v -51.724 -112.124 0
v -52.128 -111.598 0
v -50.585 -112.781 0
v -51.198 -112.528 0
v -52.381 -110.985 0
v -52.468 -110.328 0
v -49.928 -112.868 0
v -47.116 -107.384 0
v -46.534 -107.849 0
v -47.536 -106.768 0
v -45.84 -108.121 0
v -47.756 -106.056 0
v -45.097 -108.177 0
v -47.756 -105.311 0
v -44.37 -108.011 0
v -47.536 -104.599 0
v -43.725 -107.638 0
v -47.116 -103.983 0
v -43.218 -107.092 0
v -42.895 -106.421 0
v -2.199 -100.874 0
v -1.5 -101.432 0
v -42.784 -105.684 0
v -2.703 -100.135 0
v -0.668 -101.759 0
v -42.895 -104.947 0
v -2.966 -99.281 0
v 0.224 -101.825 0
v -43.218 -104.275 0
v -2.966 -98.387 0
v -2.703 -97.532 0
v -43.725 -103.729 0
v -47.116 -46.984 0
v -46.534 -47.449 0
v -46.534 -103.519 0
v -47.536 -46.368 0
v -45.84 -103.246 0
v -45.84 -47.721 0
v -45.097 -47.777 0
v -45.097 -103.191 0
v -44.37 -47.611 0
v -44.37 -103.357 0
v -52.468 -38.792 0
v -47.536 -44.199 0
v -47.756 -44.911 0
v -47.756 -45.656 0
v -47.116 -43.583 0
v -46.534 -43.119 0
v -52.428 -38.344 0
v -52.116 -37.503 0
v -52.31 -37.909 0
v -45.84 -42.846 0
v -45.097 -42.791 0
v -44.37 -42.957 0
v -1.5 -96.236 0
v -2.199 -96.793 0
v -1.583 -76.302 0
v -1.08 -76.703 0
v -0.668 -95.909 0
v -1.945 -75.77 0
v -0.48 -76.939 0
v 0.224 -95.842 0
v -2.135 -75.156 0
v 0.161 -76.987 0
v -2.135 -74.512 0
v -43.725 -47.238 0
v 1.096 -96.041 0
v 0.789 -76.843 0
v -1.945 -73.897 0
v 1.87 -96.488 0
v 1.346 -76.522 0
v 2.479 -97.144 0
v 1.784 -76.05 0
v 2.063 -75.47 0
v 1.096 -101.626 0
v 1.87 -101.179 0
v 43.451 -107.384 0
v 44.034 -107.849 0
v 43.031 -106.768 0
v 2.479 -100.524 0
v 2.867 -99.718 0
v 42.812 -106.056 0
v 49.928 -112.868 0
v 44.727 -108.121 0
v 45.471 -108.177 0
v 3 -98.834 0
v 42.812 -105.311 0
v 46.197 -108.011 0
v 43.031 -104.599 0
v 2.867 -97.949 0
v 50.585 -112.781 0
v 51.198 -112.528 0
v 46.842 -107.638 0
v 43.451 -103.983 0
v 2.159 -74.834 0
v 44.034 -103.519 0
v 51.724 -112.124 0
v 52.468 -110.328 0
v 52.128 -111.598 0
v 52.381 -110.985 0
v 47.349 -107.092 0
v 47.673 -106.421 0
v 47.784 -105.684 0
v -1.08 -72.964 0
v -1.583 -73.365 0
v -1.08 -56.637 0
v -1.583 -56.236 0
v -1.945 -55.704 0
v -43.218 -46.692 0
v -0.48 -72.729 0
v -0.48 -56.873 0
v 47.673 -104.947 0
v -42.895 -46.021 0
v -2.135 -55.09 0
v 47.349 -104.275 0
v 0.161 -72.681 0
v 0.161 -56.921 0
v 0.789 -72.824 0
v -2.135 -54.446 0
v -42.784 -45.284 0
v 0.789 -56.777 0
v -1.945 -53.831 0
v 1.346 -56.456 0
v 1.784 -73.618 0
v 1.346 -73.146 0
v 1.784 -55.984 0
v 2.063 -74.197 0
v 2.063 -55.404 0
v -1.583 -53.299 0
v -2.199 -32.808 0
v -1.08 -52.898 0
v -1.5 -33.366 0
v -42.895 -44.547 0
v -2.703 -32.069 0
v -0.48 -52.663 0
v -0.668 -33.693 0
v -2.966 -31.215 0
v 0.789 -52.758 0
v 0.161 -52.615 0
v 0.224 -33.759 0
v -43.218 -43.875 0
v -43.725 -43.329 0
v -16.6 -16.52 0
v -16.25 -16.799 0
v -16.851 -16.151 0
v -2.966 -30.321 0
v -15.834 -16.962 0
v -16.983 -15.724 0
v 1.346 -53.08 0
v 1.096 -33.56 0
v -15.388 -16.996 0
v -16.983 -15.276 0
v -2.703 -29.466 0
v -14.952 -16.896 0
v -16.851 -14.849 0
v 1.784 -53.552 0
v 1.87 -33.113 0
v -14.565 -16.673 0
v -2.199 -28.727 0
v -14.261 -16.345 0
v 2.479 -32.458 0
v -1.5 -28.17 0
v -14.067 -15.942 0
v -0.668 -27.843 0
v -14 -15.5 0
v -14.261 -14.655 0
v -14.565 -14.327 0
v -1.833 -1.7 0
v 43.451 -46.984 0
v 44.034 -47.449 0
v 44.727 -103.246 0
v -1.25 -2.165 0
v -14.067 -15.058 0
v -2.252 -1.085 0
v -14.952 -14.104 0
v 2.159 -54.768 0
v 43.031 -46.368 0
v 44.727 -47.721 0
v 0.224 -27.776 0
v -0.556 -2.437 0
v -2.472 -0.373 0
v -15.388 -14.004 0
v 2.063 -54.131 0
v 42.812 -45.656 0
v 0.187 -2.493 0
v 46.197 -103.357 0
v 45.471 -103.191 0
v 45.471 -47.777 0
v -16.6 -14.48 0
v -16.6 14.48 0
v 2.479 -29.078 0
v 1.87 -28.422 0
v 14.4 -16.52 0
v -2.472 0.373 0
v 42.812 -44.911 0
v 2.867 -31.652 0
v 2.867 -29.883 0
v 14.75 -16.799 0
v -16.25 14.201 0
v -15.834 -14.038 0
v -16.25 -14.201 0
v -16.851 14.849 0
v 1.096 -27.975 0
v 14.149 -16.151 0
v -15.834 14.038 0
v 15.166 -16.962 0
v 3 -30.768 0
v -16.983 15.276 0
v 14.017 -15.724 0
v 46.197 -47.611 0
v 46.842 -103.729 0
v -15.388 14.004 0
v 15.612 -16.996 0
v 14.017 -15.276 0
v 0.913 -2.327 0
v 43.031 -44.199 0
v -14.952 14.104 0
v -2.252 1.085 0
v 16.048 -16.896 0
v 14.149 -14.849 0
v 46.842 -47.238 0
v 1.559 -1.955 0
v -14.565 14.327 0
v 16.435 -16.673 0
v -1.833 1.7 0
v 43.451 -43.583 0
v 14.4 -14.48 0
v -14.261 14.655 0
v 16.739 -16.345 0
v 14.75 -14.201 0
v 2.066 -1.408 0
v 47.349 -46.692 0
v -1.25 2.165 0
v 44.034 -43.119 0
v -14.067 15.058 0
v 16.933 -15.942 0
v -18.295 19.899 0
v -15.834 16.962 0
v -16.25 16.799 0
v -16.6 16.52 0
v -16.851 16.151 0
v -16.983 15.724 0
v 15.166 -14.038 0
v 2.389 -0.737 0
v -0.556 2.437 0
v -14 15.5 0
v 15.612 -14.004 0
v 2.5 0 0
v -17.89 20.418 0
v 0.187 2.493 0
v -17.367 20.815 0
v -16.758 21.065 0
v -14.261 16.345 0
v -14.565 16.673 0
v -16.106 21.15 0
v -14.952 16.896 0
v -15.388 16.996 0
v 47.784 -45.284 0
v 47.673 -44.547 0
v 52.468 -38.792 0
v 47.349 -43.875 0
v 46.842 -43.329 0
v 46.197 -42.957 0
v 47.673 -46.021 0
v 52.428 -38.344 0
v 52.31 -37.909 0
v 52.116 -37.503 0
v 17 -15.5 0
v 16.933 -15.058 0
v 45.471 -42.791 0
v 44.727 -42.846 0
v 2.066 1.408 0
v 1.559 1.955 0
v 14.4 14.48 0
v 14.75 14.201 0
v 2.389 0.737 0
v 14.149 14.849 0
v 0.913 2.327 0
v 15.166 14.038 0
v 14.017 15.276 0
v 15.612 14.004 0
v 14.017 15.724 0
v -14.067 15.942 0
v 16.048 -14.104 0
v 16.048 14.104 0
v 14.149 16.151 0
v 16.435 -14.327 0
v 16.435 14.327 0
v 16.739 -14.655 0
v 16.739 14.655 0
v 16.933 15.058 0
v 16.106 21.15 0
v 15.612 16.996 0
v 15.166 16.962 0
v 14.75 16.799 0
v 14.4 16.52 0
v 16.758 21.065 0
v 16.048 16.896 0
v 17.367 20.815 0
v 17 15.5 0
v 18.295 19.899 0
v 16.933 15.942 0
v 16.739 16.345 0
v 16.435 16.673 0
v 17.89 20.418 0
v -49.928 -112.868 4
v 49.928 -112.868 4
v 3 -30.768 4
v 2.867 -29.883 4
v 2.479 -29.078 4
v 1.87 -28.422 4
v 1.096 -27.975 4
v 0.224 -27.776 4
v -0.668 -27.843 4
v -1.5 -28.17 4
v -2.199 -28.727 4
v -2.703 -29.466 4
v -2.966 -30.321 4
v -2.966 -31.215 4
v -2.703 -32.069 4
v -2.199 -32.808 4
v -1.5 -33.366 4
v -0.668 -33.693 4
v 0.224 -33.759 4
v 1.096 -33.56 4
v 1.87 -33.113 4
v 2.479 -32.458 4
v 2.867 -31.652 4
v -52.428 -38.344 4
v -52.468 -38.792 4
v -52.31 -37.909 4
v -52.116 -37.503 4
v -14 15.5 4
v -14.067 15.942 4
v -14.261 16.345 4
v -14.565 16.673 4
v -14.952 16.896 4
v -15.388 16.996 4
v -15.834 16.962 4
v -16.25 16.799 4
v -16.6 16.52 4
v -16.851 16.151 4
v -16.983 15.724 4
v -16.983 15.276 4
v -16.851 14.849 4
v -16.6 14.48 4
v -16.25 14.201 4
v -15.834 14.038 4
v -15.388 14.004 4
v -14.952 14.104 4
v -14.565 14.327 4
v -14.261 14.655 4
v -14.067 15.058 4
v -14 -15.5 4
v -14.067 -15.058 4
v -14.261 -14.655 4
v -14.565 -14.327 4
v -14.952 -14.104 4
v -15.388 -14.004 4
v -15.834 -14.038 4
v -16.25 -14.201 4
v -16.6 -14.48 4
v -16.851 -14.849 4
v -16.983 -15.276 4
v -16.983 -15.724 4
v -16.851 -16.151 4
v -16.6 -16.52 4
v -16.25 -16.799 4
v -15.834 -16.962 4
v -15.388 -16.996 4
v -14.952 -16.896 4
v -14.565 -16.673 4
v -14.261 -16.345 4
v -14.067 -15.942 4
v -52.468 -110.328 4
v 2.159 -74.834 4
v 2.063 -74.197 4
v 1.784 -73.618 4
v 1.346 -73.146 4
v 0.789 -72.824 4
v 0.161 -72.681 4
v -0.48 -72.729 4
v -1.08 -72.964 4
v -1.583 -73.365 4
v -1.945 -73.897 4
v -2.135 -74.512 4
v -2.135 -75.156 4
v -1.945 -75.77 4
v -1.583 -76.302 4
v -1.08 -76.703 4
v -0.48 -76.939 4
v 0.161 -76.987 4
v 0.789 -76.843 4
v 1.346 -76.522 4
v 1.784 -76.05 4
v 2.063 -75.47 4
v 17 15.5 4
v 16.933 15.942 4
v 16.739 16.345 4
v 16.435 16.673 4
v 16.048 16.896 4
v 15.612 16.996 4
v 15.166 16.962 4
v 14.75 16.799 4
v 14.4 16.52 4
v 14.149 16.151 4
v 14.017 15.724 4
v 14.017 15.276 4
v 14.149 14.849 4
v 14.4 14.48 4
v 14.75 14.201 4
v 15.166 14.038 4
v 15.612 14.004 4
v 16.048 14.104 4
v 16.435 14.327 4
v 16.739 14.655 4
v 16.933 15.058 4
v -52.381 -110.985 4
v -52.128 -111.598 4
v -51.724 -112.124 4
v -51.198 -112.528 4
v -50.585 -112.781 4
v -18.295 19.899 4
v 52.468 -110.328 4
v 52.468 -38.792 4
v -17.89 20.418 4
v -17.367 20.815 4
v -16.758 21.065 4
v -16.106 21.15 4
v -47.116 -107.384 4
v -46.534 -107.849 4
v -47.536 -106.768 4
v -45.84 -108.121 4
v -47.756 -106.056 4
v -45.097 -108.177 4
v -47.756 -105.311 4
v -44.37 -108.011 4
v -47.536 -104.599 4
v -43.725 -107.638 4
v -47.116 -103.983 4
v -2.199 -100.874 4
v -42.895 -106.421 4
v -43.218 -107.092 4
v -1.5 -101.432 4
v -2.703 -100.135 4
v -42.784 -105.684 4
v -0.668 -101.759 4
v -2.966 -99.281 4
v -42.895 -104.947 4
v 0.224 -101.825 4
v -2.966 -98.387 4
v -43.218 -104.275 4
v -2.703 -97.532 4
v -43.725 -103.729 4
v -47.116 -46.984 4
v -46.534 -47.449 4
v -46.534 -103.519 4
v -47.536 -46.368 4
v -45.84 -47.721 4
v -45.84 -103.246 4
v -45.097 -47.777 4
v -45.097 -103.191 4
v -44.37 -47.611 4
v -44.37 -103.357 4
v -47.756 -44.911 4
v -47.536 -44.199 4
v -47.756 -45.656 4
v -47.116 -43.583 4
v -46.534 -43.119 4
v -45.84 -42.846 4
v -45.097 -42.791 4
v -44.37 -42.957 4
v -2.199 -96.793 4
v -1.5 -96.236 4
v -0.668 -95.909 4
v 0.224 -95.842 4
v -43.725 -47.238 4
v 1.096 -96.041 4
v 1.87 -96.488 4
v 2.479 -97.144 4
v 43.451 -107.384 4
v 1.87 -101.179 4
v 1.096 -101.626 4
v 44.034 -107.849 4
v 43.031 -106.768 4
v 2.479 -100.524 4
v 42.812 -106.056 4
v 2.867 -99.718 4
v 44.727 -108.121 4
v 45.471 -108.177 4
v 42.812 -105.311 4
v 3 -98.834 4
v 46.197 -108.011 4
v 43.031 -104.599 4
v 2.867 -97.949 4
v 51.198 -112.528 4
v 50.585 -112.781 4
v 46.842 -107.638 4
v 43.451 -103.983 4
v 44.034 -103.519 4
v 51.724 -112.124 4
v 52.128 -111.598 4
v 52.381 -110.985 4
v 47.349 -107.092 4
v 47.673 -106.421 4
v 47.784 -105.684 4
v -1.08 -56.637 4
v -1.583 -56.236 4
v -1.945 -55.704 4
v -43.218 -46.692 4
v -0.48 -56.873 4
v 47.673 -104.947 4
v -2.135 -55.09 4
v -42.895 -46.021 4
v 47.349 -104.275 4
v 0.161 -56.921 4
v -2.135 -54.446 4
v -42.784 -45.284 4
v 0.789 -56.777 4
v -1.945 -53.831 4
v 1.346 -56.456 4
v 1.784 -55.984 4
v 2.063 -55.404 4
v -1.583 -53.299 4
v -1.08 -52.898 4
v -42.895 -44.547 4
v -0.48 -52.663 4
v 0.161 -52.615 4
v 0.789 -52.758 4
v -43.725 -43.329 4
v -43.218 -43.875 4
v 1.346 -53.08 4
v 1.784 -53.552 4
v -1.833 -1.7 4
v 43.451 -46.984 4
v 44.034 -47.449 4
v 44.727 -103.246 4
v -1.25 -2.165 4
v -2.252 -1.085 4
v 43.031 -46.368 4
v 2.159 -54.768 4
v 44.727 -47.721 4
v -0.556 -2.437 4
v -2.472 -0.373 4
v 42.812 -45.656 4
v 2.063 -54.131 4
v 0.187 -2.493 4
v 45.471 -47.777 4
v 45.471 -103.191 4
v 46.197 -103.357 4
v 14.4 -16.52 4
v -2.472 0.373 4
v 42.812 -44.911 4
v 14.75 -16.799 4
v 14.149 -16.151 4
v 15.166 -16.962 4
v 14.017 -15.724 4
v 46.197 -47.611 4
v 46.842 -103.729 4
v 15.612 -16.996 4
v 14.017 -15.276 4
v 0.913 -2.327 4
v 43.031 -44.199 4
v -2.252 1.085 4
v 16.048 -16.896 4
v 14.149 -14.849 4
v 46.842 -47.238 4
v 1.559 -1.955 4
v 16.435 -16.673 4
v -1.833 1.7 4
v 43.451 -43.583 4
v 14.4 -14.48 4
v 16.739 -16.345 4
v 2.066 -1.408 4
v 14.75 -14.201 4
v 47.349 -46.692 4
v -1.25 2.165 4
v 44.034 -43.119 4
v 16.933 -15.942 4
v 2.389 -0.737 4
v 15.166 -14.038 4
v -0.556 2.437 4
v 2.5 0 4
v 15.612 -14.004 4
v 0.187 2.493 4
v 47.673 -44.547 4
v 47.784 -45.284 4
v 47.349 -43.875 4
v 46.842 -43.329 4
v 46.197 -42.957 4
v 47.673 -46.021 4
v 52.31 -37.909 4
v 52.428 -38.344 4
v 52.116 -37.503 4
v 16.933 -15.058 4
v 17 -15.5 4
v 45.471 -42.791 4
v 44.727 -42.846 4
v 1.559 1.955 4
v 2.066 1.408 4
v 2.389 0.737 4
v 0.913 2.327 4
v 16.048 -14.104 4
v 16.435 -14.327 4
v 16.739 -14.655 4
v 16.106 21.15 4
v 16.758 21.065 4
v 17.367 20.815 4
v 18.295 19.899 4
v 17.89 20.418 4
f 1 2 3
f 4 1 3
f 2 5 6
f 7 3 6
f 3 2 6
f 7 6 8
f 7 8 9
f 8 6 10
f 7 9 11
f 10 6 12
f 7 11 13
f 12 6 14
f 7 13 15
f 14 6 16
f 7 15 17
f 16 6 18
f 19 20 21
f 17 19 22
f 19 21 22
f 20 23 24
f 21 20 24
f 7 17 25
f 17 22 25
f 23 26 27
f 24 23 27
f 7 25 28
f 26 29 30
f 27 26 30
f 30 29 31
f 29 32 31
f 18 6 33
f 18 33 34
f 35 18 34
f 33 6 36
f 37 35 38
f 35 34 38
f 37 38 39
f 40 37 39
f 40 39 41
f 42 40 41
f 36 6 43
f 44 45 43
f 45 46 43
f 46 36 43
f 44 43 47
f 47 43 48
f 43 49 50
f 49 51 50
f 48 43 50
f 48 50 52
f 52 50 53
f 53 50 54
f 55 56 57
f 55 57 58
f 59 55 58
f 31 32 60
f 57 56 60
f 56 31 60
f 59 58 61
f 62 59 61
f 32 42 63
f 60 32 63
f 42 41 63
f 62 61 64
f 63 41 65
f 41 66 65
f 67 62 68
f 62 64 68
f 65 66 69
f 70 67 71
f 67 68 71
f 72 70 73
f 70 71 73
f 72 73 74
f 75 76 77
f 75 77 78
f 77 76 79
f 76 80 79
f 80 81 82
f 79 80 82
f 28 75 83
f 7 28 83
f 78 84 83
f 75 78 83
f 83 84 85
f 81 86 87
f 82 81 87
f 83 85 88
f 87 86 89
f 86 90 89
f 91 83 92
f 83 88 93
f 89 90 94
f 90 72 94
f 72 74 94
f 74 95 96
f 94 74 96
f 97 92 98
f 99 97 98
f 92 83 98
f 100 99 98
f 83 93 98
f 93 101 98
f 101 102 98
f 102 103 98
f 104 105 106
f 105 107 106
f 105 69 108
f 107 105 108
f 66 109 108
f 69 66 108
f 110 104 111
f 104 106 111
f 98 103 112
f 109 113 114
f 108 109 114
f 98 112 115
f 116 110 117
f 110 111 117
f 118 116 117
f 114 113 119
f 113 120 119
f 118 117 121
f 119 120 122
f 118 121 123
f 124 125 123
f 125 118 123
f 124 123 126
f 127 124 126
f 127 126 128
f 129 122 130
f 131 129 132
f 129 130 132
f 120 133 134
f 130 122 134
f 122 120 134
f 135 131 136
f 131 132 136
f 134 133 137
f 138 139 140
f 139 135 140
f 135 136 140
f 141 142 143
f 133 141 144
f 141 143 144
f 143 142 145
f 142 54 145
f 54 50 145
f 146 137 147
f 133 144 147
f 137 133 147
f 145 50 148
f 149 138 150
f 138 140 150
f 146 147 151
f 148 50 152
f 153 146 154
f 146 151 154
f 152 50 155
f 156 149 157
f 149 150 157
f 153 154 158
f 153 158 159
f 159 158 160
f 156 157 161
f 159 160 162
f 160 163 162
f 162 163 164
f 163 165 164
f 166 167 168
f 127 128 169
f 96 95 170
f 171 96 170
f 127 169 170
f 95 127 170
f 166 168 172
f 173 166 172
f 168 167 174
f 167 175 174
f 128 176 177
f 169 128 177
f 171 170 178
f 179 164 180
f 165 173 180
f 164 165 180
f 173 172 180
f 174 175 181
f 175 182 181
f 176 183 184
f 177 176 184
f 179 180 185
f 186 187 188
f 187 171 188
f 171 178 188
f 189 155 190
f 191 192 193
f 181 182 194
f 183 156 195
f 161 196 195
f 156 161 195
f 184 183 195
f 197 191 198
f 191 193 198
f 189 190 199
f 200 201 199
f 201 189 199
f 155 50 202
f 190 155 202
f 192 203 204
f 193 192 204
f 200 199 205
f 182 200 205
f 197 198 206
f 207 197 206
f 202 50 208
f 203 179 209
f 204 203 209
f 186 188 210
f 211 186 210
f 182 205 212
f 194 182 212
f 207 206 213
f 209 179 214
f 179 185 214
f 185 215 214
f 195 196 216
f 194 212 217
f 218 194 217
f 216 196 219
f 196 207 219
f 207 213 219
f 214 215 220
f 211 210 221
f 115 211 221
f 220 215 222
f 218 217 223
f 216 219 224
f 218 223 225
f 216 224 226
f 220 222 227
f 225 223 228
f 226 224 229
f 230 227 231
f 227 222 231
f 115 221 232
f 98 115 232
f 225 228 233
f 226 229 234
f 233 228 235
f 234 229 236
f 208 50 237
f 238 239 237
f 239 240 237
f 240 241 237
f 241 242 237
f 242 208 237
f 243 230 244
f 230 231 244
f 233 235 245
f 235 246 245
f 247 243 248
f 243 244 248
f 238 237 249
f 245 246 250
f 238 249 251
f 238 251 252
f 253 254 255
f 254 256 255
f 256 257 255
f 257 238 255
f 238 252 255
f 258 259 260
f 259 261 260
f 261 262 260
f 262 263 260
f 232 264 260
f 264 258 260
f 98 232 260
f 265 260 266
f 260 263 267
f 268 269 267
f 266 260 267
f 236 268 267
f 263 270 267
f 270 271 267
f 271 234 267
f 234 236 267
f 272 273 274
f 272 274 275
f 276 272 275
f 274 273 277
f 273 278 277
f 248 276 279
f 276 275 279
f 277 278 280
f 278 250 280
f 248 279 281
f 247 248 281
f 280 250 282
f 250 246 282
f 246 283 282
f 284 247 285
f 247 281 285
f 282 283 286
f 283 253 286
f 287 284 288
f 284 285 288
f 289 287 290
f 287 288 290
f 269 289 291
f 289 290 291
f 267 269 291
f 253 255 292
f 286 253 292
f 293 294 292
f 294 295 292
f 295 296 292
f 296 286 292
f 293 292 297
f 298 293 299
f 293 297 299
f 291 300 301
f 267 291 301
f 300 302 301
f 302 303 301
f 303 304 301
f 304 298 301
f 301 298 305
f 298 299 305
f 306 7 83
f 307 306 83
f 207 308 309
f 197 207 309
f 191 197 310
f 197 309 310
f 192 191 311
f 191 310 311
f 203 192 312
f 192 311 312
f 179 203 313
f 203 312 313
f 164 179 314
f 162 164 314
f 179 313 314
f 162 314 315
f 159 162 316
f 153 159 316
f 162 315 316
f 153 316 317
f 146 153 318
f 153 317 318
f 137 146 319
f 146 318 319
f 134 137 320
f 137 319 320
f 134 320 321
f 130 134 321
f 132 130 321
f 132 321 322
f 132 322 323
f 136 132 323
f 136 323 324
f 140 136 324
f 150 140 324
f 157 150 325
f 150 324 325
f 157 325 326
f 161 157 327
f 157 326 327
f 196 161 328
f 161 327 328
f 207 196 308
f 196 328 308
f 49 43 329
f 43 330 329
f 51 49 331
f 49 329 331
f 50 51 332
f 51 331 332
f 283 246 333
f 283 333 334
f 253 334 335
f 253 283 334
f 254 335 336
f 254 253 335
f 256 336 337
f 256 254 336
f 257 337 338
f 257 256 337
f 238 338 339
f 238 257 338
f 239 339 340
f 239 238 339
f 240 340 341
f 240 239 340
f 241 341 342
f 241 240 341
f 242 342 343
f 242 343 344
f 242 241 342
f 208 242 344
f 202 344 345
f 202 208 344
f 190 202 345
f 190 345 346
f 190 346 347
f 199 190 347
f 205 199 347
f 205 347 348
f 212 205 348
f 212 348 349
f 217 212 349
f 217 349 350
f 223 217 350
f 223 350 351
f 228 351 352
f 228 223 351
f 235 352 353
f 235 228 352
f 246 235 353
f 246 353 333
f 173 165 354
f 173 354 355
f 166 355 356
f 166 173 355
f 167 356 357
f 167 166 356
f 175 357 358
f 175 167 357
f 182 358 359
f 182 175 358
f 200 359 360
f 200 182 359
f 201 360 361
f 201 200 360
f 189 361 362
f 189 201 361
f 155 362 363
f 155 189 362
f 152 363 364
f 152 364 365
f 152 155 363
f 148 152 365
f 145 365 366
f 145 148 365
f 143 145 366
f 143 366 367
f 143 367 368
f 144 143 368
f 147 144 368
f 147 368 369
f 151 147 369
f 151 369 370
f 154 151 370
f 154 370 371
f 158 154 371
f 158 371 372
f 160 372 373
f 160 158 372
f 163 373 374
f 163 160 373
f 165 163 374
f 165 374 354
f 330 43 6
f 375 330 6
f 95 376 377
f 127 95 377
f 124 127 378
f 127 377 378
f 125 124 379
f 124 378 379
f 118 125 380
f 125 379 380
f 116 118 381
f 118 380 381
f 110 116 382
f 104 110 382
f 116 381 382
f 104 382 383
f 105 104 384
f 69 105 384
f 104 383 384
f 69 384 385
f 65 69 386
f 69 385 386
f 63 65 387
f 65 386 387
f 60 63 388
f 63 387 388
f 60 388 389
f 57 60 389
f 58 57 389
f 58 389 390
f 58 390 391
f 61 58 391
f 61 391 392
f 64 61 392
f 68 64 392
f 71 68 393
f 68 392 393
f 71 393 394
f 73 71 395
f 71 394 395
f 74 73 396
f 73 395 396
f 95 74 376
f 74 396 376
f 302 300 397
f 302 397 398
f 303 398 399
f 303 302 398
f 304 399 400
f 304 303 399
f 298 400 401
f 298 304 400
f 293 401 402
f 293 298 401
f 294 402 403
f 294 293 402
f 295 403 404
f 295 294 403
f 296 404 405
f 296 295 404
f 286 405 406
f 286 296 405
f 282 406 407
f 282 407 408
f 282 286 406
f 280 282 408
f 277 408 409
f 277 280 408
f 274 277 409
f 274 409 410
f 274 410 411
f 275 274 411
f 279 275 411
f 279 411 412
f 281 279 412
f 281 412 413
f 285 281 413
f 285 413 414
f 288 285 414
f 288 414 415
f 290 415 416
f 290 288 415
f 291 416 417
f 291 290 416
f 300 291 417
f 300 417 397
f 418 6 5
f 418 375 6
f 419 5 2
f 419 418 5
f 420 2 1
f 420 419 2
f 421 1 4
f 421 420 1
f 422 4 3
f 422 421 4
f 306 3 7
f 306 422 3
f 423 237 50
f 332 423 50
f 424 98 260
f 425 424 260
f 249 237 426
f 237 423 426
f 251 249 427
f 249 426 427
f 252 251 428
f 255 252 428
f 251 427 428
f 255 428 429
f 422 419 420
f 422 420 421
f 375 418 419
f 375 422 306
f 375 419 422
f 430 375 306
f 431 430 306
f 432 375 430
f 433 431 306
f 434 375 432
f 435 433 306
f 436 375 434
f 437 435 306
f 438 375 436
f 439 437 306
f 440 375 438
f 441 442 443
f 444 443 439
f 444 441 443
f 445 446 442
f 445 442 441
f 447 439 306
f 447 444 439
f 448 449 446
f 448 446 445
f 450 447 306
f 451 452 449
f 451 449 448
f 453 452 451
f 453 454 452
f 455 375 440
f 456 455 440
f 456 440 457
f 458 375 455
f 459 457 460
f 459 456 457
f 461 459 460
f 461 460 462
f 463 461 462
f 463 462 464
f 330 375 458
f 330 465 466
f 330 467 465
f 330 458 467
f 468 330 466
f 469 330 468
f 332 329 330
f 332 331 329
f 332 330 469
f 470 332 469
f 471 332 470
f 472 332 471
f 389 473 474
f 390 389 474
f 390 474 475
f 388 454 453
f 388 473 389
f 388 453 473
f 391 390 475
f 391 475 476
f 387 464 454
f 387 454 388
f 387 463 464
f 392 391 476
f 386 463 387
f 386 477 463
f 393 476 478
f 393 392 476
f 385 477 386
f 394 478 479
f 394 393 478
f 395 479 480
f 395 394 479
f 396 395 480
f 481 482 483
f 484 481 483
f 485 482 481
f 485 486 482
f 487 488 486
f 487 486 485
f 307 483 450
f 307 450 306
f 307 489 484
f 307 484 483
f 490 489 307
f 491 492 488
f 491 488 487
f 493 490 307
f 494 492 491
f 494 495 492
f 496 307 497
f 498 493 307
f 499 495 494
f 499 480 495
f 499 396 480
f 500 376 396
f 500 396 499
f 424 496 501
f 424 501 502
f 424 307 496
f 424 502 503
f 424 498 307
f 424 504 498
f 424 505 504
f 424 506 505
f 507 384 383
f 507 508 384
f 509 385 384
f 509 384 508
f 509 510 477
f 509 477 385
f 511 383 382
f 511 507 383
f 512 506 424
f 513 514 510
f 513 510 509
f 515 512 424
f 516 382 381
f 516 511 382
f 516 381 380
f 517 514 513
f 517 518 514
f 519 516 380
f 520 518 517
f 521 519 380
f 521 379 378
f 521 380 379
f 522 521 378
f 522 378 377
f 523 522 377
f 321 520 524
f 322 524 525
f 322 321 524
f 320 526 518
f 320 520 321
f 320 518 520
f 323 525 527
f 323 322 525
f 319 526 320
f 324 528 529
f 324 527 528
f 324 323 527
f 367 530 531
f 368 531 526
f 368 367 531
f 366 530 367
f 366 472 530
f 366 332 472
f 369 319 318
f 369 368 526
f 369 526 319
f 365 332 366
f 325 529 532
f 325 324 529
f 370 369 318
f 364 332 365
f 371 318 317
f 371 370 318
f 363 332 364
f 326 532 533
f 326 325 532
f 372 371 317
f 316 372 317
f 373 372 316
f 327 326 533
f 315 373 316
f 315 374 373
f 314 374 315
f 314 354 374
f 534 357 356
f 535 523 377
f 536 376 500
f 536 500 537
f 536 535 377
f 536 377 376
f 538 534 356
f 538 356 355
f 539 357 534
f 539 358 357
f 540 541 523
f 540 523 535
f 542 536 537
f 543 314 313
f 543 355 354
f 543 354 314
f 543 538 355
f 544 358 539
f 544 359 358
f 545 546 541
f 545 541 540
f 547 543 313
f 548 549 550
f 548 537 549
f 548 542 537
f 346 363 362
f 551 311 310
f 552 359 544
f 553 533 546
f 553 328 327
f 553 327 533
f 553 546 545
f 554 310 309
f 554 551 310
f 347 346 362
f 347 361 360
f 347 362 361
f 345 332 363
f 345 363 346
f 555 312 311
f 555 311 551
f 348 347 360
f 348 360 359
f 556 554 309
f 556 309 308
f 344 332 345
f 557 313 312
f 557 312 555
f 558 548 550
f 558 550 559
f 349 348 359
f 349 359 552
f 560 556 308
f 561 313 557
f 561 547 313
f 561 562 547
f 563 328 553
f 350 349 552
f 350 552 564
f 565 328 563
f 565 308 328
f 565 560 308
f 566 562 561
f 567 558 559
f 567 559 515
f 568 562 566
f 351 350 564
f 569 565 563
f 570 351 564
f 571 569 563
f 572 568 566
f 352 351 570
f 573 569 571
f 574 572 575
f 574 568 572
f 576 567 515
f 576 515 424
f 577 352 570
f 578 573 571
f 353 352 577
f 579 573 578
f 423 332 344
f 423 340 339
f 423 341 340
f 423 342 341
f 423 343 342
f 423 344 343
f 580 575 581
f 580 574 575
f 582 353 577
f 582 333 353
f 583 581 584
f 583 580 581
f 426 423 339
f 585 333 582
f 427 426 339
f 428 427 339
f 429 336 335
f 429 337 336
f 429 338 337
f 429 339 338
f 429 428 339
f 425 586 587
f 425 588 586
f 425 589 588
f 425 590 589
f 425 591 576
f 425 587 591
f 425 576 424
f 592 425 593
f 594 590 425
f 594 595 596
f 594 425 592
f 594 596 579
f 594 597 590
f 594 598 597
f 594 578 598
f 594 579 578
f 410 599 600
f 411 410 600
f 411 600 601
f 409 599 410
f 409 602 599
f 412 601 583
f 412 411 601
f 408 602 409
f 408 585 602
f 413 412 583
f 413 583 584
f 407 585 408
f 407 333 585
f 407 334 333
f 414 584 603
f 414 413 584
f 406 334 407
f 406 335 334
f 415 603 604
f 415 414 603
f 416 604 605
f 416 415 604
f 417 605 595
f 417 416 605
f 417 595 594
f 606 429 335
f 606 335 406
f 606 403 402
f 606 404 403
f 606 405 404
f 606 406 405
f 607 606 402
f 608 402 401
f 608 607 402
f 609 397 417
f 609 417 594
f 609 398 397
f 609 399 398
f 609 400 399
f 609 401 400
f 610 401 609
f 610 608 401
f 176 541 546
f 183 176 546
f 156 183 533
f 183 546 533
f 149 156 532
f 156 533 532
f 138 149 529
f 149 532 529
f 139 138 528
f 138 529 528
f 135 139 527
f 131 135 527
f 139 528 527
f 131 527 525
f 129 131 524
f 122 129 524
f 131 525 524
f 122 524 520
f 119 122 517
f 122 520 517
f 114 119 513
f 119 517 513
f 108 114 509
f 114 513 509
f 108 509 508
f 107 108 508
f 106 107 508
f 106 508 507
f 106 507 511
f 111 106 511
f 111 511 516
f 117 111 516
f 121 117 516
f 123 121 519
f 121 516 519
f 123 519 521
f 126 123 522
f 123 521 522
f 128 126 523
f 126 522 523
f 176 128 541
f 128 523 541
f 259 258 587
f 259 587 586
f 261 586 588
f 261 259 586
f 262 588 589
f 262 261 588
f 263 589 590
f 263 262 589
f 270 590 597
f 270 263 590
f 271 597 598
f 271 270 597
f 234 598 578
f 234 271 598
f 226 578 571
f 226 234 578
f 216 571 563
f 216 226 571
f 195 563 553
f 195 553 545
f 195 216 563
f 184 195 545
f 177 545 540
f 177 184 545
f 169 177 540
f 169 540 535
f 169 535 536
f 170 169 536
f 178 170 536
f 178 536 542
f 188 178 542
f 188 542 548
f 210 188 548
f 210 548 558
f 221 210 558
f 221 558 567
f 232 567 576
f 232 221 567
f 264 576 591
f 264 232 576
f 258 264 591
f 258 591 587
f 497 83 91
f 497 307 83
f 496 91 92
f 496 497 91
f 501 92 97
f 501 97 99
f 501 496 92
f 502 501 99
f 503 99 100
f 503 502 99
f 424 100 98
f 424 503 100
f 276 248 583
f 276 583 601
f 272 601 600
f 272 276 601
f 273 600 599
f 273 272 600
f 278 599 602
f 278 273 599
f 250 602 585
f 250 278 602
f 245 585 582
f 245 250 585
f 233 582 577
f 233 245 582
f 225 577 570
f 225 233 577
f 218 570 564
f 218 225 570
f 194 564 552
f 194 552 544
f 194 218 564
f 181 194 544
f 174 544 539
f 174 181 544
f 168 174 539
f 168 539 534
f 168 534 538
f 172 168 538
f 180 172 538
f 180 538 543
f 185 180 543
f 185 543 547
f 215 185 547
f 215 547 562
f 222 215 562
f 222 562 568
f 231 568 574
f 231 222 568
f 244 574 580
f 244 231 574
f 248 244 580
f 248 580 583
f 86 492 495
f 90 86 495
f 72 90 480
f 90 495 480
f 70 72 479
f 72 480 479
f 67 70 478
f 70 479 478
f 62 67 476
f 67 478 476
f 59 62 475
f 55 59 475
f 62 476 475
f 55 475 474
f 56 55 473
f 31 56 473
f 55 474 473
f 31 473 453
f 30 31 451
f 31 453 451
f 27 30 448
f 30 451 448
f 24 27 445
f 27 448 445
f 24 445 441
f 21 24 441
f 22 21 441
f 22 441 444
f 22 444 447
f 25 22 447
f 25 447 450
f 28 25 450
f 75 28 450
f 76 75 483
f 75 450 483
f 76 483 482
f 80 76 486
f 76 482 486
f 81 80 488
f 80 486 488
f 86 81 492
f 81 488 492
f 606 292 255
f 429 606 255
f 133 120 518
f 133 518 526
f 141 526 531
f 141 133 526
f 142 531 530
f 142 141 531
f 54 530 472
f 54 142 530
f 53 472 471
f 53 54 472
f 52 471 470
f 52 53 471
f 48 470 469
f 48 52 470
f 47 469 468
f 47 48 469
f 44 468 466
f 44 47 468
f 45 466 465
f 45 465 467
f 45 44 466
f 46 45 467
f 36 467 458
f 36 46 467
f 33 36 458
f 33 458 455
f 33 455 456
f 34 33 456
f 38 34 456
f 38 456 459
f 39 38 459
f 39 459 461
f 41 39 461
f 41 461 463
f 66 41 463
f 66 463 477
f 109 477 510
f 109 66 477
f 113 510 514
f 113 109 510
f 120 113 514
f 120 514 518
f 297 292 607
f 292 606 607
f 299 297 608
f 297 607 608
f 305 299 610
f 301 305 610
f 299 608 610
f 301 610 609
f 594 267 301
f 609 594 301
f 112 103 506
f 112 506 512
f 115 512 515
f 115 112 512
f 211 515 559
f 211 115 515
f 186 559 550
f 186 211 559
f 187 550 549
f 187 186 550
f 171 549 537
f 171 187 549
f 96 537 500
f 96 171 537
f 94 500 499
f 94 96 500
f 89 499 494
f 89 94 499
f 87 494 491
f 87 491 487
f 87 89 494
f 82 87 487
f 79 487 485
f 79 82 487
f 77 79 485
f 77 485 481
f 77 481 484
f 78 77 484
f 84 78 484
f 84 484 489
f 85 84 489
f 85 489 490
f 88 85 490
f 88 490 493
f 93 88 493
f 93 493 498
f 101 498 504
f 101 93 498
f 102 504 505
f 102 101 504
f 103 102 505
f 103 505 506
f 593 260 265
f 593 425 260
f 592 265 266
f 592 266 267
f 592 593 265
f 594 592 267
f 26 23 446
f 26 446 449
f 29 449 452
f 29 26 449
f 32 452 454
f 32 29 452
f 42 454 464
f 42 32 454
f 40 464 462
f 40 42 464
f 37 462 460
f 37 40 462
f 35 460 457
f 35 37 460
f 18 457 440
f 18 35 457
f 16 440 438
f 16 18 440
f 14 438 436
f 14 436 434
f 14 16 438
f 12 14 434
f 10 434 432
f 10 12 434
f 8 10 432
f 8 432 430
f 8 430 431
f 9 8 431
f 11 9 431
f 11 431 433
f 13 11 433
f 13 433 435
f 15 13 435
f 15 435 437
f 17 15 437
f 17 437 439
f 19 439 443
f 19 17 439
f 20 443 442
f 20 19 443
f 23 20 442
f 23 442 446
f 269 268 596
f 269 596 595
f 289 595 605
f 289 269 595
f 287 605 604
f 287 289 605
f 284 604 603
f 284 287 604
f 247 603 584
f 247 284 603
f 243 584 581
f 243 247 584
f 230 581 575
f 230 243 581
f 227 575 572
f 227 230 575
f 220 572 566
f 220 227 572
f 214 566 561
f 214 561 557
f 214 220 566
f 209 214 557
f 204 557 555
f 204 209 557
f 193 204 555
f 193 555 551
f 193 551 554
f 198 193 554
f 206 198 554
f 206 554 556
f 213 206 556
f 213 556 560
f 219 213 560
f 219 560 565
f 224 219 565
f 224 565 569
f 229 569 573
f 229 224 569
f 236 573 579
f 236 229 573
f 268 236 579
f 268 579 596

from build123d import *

# Parameters (mm, degrees)
SKETCH4_R           = 2.5
SKETCH4_R_2         = 1.5
BOSS_EXTRUDE1_DEPTH = 4
SKETCH5_R           = 2.159
SKETCH5_R_2         = 3
CUT_EXTRUDE1_DEPTH  = 4
FILLET1_R           = 2.54


with BuildPart() as part:
    # Sketch4 → Boss-Extrude1 (new body)
    with BuildSketch(Plane.XY):
        Polygon((-52.467947032, -38.099537239), (-52.467947032, -112.867947032), (52.467947032, -112.867947032), (52.467947032, -38.099537239), (17.557897552, 21.15), (-17.557897552, 21.15), align=None)
        with Locations((-45.283742135, -45.283742135)):
            Circle(SKETCH4_R, mode=Mode.SUBTRACT)
        with Locations((45.283742135, -45.283742135)):
            Circle(SKETCH4_R, mode=Mode.SUBTRACT)
        with Locations((45.283742135, -105.683742135)):
            Circle(SKETCH4_R, mode=Mode.SUBTRACT)
        with Locations((-45.283742135, -105.683742135)):
            Circle(SKETCH4_R, mode=Mode.SUBTRACT)
        with Locations((-15.5, -15.5)):
            Circle(SKETCH4_R_2, mode=Mode.SUBTRACT)
        with Locations((-15.5, 15.5)):
            Circle(SKETCH4_R_2, mode=Mode.SUBTRACT)
        with Locations((15.5, 15.5)):
            Circle(SKETCH4_R_2, mode=Mode.SUBTRACT)
        with Locations((15.5, -15.5)):
            Circle(SKETCH4_R_2, mode=Mode.SUBTRACT)
        Circle(SKETCH4_R, mode=Mode.SUBTRACT)
    extrude(amount=BOSS_EXTRUDE1_DEPTH)

    # Sketch5 → Cut-Extrude1 (cut)
    with BuildSketch(Plane.XY.offset(4)):
        with Locations((0, -54.767742135)):
            Circle(SKETCH5_R)
        with Locations((0, -74.833742135)):
            Circle(SKETCH5_R)
        with Locations((0, -30.767742135)):
            Circle(SKETCH5_R_2)
        with Locations((0, -98.833742135)):
            Circle(SKETCH5_R_2)
    extrude(amount=-CUT_EXTRUDE1_DEPTH, mode=Mode.SUBTRACT)

    # Fillet1
    fillet1_edges = [part.edges().sort_by_distance(p)[0] for p in [
        (-52.467947032, -38.099537239, 2),
        (-17.557897552, 21.15, 2),
        (17.557897552, 21.15, 2),
        (52.467947032, -38.099537239, 2),
        (52.467947032, -112.867947032, 2),
        (-52.467947032, -112.867947032, 2),
    ]]
    fillet(fillet1_edges, radius=FILLET1_R)


solid = part.part
